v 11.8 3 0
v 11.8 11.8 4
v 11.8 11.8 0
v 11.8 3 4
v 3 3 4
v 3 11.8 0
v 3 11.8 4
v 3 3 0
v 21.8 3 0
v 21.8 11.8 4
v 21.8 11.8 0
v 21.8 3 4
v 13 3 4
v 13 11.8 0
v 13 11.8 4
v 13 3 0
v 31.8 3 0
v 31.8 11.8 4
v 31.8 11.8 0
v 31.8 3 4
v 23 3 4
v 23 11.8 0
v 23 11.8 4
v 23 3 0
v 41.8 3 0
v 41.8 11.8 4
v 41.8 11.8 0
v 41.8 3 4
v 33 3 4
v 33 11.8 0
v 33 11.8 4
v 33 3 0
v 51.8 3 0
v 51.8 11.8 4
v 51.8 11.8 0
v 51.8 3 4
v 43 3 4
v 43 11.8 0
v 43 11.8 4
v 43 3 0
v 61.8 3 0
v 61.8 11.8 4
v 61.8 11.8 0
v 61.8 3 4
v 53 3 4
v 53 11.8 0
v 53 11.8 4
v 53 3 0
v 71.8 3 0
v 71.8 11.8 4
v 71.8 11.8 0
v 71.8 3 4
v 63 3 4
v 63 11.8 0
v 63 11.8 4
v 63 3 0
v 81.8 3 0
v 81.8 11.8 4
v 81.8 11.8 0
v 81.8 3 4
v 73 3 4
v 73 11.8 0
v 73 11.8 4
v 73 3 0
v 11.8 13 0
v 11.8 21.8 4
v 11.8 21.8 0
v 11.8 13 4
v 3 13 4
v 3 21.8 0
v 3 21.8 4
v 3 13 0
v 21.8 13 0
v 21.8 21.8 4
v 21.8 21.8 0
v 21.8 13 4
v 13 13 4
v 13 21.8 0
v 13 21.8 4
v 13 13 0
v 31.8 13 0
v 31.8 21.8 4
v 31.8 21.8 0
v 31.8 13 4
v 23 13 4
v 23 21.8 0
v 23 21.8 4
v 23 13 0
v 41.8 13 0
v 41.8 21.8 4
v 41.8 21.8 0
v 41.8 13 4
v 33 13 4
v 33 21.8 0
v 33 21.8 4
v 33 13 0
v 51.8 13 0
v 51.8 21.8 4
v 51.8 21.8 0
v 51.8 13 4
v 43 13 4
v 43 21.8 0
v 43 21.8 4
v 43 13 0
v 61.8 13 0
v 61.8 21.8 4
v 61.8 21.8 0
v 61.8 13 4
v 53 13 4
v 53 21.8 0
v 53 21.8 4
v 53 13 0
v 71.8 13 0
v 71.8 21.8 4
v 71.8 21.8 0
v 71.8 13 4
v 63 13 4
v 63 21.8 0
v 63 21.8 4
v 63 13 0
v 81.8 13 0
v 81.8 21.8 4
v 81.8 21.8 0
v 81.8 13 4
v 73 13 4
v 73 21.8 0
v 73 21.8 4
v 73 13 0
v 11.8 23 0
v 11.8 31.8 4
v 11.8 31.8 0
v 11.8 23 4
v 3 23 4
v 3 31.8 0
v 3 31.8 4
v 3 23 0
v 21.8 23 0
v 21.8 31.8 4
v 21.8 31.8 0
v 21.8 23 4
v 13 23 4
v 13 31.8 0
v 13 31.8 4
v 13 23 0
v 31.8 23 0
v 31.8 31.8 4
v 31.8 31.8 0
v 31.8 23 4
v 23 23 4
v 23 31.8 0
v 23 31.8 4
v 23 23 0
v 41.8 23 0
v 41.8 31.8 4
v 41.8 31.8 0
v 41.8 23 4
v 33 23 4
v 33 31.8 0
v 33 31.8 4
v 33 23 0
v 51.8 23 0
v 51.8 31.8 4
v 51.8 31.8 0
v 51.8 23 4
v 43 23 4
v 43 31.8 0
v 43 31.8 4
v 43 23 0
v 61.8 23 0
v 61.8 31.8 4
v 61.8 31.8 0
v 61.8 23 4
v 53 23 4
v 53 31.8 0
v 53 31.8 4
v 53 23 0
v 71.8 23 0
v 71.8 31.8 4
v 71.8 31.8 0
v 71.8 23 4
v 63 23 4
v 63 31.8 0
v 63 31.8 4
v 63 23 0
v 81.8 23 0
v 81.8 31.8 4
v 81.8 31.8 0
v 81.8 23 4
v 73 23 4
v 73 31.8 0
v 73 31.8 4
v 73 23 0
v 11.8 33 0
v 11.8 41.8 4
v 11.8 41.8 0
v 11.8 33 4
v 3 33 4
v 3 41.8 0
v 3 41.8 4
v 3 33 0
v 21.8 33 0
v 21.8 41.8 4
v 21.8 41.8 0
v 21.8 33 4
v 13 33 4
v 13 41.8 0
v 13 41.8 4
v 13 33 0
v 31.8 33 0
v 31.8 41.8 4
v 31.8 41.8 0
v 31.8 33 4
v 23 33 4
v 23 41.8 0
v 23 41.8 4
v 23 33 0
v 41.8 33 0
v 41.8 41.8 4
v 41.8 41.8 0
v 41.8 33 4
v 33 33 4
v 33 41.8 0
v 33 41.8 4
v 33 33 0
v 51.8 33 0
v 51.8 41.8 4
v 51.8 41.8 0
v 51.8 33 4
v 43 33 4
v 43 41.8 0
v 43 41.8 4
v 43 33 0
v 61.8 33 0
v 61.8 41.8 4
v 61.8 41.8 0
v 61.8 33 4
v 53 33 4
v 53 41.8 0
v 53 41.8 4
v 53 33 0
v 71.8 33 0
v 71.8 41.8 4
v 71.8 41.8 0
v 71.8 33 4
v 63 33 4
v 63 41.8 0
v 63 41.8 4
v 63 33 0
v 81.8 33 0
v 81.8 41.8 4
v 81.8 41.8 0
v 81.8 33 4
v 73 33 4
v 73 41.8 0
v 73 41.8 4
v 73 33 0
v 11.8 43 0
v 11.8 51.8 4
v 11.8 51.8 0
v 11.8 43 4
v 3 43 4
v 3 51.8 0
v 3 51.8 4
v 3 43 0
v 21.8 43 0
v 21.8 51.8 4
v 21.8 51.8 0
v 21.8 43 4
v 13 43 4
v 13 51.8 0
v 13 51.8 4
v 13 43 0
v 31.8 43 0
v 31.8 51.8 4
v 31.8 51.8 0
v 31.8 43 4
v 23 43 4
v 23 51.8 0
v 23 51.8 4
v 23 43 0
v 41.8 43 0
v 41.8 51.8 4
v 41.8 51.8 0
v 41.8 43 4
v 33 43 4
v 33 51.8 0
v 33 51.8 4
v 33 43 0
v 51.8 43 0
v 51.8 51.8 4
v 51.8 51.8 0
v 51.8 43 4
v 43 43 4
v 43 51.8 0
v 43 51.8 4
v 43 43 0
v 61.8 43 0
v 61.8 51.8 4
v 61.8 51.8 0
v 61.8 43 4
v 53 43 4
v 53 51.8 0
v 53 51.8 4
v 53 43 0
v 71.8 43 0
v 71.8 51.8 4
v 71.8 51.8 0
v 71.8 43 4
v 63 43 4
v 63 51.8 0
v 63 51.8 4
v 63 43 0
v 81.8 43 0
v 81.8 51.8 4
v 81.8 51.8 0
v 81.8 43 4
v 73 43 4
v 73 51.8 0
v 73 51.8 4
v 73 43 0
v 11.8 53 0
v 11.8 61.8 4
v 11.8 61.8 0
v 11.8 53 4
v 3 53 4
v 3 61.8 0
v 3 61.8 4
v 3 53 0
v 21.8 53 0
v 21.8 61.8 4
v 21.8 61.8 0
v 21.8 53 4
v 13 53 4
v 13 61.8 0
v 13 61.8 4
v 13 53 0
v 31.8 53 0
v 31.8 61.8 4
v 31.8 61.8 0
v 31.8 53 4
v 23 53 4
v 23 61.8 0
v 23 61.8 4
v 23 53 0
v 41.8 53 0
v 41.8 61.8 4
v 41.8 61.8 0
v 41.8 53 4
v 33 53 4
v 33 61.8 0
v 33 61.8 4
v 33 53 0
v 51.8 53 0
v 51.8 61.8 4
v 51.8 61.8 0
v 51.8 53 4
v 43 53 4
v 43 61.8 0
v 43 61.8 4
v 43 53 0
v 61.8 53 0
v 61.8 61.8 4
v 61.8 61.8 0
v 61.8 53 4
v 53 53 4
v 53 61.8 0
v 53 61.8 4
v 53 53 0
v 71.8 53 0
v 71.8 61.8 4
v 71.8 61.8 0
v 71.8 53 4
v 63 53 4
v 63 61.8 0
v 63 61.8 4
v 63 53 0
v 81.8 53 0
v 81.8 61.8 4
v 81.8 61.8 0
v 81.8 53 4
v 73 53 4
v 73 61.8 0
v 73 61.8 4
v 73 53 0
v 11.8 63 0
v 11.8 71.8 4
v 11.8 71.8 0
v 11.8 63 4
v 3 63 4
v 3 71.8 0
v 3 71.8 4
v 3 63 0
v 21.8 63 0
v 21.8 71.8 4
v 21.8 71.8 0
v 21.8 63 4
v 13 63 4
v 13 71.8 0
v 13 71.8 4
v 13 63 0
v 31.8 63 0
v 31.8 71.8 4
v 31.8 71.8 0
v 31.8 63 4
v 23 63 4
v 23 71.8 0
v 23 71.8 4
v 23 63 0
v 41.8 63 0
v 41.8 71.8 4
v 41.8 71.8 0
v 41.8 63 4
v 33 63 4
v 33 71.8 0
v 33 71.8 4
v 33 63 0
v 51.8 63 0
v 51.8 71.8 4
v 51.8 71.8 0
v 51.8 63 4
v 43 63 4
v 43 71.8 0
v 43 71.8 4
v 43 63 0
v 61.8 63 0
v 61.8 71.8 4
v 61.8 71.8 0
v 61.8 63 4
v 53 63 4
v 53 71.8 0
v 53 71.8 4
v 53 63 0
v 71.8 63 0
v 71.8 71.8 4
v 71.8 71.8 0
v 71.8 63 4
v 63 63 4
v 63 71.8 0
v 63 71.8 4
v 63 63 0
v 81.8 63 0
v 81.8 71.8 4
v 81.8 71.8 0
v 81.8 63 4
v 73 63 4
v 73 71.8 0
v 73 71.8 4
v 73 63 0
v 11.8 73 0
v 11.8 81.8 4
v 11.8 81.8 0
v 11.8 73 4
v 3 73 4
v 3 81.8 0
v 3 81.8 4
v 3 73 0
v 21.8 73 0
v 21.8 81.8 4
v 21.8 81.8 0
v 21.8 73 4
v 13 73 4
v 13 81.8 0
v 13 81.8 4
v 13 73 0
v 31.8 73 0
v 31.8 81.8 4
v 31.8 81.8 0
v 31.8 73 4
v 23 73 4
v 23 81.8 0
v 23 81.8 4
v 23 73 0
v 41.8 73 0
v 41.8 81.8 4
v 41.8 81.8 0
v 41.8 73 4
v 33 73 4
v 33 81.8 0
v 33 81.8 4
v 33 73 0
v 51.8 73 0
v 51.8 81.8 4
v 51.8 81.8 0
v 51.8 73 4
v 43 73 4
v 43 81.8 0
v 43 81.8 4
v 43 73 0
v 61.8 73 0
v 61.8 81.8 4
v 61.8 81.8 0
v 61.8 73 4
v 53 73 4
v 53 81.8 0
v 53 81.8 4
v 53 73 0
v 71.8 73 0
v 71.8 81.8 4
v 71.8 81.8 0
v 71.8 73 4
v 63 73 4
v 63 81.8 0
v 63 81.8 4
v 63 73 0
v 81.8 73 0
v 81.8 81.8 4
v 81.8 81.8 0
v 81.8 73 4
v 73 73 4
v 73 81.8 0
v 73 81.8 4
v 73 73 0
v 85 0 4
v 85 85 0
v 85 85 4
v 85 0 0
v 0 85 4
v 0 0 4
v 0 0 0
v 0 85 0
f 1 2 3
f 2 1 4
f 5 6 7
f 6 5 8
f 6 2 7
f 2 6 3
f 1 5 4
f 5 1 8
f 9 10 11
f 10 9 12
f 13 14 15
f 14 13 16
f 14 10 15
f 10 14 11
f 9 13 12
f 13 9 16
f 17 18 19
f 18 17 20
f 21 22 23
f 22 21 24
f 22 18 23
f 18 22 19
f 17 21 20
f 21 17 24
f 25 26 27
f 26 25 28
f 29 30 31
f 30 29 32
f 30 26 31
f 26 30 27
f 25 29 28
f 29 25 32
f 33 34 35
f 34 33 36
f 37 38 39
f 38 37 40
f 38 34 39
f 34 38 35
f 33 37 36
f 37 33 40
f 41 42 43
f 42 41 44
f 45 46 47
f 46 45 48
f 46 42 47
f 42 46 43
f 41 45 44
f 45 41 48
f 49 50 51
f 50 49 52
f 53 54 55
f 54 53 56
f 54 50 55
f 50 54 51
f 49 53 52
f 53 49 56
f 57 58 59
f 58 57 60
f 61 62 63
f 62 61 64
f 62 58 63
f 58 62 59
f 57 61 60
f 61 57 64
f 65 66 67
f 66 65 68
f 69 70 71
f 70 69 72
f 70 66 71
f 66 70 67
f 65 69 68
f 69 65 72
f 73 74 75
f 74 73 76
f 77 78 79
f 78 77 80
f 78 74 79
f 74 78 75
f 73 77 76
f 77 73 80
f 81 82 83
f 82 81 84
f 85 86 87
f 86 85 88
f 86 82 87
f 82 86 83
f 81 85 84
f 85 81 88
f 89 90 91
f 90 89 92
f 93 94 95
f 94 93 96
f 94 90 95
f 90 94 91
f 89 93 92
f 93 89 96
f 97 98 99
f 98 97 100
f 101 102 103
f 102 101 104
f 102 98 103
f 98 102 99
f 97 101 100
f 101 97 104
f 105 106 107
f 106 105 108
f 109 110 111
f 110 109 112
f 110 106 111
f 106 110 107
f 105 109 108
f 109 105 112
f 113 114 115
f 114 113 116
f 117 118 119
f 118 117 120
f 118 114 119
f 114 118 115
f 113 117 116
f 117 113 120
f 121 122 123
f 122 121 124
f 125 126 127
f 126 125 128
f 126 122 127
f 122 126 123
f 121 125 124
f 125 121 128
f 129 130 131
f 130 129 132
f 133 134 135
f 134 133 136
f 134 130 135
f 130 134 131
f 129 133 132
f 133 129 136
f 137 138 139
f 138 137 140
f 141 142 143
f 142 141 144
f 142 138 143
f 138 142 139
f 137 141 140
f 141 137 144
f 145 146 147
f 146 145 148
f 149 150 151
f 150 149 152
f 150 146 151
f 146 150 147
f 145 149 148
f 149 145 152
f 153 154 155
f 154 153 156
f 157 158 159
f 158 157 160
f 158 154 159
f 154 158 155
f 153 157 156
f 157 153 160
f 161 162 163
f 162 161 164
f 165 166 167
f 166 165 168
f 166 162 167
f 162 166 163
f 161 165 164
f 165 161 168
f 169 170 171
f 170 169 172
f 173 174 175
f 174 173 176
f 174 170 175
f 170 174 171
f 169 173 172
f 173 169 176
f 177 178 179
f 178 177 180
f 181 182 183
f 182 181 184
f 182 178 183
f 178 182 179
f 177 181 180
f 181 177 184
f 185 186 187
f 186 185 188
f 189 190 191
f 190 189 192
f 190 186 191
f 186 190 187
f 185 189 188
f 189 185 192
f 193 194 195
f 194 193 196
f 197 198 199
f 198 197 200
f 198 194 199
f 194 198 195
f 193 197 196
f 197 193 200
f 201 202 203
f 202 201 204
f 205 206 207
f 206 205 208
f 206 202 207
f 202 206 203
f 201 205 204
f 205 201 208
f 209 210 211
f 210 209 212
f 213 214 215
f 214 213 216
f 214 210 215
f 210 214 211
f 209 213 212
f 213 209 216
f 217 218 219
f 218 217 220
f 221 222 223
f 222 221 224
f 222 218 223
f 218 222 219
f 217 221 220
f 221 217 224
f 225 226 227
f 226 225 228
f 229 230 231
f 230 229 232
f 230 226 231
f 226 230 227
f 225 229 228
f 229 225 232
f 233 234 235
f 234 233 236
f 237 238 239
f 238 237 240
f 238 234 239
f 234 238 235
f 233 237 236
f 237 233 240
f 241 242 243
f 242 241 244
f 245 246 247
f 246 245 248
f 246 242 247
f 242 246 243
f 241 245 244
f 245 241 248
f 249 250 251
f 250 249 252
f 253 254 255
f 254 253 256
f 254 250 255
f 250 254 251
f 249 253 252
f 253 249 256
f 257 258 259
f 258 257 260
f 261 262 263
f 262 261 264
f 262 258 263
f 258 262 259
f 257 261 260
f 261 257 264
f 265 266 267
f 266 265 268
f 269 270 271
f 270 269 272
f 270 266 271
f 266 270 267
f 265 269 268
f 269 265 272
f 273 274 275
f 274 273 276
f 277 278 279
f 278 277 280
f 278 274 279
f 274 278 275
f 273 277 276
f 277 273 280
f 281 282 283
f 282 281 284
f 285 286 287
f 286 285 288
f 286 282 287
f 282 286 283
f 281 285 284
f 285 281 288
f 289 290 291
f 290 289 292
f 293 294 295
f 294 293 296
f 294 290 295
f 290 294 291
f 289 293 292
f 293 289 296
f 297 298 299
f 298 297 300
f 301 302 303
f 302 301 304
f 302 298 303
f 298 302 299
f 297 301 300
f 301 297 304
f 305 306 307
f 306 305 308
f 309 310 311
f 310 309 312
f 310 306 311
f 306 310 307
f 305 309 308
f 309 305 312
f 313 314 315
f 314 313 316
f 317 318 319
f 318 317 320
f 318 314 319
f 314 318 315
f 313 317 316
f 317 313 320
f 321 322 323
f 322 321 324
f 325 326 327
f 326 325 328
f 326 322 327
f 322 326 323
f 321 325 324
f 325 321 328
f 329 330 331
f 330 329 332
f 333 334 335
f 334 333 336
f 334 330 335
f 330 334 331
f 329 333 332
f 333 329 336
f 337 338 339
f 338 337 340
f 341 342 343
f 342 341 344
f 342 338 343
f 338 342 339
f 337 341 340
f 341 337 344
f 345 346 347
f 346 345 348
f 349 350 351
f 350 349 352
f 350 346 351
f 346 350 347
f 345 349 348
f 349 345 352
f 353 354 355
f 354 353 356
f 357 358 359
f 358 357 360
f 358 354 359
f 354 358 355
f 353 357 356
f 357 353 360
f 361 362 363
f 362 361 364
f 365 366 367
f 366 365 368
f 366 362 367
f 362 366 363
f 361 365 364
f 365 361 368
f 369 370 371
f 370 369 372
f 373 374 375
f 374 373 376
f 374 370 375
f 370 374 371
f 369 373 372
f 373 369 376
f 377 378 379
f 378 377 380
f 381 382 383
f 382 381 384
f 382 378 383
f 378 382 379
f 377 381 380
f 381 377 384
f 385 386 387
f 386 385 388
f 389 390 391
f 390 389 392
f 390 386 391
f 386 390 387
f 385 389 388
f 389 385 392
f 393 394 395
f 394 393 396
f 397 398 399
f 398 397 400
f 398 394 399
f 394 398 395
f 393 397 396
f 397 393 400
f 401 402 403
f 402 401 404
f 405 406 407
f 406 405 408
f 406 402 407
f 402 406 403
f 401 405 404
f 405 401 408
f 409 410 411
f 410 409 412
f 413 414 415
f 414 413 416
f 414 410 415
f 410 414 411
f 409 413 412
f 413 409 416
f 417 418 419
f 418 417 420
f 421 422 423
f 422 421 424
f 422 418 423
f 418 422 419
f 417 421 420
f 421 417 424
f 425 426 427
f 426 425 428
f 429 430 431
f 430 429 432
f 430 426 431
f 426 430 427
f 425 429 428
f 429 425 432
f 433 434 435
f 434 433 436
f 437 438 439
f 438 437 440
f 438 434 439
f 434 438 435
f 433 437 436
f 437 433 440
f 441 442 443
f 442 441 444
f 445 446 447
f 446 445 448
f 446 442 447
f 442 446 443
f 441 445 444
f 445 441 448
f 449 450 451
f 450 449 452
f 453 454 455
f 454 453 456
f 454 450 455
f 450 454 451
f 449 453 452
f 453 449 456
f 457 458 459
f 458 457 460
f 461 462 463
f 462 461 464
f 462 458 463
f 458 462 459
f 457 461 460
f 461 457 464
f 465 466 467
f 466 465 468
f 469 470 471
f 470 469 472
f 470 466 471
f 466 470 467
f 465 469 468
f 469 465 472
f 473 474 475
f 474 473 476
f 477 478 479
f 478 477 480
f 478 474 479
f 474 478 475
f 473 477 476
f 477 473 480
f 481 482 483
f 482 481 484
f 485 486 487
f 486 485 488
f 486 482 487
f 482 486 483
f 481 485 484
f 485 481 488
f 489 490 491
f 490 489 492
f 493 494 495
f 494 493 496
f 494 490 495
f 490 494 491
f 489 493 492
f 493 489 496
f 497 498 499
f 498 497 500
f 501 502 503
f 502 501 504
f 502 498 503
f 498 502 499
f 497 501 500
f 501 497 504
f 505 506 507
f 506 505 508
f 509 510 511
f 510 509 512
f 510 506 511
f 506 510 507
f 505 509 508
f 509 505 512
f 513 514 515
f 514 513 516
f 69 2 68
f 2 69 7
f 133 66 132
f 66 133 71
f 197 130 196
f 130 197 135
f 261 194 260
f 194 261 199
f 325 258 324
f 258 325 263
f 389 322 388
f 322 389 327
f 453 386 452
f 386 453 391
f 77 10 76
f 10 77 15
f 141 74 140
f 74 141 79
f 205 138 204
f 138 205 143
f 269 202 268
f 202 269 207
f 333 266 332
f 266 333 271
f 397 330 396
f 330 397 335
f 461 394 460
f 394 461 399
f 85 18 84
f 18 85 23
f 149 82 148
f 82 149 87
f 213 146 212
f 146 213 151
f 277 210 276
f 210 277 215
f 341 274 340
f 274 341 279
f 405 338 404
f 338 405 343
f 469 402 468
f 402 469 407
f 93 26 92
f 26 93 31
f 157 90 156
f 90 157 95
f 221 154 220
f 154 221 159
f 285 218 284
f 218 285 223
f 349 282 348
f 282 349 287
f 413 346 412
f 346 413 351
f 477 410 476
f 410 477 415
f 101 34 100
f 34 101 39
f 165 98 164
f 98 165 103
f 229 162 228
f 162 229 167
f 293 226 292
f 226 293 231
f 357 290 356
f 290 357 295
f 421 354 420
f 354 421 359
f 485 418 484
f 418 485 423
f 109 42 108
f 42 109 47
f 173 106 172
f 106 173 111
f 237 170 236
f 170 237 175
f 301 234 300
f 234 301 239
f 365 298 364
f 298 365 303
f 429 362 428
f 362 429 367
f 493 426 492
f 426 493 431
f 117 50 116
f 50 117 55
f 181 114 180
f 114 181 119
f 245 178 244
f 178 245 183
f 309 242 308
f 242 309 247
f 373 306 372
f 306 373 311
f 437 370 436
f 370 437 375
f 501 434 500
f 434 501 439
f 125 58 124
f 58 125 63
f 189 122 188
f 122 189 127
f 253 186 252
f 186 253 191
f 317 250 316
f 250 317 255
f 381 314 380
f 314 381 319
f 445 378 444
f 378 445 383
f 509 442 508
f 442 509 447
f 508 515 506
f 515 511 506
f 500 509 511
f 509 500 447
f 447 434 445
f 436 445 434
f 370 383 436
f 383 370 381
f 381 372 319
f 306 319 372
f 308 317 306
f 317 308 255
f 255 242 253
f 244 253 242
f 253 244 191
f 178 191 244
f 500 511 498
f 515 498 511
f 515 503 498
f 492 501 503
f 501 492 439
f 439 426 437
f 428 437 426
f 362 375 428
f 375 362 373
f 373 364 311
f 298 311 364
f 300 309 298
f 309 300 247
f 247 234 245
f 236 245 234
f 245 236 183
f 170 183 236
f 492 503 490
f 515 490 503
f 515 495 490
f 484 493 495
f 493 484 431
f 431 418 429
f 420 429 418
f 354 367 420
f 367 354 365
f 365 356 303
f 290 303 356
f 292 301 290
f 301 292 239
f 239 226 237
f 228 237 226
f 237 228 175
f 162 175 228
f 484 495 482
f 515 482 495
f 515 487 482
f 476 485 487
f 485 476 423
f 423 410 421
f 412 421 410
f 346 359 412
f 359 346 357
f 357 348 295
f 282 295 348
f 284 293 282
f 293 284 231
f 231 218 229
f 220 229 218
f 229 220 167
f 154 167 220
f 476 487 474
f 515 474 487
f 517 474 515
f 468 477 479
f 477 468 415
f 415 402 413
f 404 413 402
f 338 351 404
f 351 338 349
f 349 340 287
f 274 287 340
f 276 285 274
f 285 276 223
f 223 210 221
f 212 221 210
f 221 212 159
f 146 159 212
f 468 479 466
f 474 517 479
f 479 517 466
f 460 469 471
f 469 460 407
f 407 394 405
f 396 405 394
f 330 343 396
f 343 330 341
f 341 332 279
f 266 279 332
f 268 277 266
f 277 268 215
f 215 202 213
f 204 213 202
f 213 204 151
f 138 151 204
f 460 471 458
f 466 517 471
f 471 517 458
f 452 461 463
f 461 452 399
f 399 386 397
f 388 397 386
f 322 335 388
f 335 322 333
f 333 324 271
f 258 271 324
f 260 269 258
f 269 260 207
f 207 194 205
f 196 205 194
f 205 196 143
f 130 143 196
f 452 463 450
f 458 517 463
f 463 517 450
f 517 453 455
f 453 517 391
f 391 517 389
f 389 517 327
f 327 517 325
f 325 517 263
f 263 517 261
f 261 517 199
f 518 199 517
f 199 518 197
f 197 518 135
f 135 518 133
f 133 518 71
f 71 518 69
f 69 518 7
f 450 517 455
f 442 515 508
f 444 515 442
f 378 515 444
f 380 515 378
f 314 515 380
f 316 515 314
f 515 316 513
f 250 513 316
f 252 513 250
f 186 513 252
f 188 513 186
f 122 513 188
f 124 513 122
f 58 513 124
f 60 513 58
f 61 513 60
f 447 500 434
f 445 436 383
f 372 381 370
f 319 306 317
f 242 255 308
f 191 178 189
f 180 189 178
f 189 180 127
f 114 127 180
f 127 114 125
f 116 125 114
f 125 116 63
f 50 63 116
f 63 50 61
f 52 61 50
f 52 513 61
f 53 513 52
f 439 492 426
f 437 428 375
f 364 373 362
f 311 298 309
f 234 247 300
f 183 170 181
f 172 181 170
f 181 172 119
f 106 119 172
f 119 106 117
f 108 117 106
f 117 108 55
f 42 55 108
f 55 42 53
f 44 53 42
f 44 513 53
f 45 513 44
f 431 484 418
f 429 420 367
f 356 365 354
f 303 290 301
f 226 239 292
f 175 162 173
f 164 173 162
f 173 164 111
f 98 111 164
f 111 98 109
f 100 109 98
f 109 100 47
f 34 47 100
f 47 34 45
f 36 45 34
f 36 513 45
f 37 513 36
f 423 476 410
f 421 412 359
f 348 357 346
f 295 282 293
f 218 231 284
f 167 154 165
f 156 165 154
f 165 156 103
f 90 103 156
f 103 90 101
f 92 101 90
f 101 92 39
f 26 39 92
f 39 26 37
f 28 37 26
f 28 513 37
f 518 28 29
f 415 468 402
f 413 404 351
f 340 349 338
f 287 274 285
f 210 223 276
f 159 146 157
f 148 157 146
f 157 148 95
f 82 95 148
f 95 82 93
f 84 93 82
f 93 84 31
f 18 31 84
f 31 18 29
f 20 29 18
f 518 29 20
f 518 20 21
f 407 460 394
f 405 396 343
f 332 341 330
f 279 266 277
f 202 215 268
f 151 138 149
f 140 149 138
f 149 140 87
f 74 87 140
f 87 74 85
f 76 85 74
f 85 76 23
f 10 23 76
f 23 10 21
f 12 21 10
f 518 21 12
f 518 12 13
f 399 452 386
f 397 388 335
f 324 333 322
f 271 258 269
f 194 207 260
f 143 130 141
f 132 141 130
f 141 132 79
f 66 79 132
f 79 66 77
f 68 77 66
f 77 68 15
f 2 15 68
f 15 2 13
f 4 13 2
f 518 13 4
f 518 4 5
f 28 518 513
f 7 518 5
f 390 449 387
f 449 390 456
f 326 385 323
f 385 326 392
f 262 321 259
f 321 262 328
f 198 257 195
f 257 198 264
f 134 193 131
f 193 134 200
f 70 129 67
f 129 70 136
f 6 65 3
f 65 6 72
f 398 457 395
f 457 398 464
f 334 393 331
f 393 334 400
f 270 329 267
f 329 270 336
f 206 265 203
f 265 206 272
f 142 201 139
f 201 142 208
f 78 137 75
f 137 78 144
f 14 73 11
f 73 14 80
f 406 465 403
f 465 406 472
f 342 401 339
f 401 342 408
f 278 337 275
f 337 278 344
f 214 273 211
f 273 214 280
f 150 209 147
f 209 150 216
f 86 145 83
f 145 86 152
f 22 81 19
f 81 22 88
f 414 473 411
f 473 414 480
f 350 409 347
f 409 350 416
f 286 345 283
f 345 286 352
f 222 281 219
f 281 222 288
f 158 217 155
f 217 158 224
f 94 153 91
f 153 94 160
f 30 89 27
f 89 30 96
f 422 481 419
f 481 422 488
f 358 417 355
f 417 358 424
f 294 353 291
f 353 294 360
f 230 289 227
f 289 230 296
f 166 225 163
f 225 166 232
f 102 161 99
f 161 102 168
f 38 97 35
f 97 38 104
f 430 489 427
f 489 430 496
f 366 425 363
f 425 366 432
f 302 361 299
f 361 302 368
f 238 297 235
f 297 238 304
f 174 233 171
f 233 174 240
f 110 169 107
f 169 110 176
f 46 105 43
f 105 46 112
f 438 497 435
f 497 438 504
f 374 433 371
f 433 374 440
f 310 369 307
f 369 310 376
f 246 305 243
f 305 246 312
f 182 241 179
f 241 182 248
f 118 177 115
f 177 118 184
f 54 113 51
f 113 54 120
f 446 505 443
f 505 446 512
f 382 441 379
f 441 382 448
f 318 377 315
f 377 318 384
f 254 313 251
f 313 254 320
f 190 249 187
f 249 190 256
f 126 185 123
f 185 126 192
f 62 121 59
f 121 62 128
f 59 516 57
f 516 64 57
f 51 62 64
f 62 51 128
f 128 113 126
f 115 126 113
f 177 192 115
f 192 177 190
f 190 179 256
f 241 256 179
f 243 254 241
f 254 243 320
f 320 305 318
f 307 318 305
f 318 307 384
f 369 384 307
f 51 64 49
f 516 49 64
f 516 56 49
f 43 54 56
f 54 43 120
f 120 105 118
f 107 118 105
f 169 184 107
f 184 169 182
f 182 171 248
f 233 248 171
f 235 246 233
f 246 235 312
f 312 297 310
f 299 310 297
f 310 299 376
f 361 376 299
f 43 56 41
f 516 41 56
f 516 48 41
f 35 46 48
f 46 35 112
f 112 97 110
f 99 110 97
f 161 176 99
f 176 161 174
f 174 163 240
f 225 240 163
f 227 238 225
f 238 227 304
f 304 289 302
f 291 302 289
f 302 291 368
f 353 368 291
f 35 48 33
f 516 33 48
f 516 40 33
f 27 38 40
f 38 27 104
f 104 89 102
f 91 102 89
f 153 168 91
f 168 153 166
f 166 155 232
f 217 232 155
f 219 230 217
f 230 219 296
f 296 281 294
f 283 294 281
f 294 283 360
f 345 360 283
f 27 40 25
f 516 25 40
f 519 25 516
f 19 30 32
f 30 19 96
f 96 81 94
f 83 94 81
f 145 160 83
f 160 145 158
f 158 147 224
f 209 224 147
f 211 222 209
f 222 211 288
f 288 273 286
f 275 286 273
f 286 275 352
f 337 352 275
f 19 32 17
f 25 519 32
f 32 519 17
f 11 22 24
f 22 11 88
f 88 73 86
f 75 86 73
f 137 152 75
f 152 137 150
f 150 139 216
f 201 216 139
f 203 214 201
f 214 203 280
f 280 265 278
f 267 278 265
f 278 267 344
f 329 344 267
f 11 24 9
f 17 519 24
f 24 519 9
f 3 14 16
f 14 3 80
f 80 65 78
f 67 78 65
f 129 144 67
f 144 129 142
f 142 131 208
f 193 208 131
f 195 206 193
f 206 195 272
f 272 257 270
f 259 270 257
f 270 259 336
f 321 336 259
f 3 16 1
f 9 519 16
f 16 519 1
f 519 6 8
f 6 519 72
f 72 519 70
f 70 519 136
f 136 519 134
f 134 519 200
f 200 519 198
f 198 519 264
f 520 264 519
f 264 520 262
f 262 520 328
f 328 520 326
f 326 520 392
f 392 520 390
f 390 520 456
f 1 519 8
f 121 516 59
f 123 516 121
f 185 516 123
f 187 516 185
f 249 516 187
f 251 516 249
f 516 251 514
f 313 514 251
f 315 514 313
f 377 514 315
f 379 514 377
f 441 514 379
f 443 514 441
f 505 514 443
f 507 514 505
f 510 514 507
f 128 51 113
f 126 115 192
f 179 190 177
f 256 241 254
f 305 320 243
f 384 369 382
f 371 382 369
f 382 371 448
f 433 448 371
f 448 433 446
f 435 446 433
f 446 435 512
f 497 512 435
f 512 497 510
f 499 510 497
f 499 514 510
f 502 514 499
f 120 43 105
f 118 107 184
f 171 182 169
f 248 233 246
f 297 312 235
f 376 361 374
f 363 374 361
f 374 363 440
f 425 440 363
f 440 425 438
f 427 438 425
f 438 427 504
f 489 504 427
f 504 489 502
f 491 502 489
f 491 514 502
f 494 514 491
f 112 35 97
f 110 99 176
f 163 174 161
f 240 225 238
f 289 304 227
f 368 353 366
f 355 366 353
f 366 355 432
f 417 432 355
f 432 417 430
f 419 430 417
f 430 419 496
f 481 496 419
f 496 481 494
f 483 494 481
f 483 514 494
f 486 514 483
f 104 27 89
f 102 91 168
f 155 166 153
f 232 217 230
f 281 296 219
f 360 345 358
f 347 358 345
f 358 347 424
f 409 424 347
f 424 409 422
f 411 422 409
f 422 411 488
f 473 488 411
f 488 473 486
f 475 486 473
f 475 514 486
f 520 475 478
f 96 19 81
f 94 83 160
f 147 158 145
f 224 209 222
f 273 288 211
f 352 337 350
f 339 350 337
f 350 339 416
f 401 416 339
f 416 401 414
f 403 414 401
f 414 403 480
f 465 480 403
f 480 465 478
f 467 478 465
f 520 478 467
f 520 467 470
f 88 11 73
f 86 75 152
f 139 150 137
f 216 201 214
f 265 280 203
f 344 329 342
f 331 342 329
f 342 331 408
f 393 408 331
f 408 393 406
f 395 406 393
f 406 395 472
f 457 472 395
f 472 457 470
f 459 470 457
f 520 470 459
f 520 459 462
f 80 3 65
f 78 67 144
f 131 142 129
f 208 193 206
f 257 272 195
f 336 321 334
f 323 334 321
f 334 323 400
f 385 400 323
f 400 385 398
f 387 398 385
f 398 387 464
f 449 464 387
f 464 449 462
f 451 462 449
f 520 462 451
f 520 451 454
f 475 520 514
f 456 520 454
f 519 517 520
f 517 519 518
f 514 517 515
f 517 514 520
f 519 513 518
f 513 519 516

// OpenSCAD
// WS2812 / WS2812b Led Matrix Diffuser by malebuffy

PCB_HEIGHT = 85; // Size of PCB in mm
PCB_WIDTH = 85; // Size of PCB in mm
NUMBER_LEDS_HORIZONTAL=8; // Number of Leds in a row
NUMBER_LEDS_VERTICAL=8;   // Number of Leds in a column
DIFFUSER_HEIGHT = 4; // Height of diffuser
LED_SIZE = 5; // Size of leds in mm
DISTANCE_BETWEEN_LEDS=5; // Distance between leds in mm
WALL_THINKESS=1.2; // Thinkess of walls
PCB_BORDER = 3;  // PCB Outer Boarder in mm

buffer=DISTANCE_BETWEEN_LEDS-WALL_THINKESS;


difference() {

cube([PCB_HEIGHT,PCB_WIDTH,DIFFUSER_HEIGHT]); // Create Main PCB Diffuser

for ( i = [0:NUMBER_LEDS_HORIZONTAL-1] ) {
    
    translate([PCB_BORDER,(LED_SIZE+DISTANCE_BETWEEN_LEDS)*i,-1])
    
    for ( j = [0:NUMBER_LEDS_VERTICAL-1] ) {
        
     translate([(LED_SIZE+DISTANCE_BETWEEN_LEDS)*j,PCB_BORDER,-1]) cube([LED_SIZE+buffer,LED_SIZE+buffer,DIFFUSER_HEIGHT+5]);   
        
        
        
  }
 }
}
